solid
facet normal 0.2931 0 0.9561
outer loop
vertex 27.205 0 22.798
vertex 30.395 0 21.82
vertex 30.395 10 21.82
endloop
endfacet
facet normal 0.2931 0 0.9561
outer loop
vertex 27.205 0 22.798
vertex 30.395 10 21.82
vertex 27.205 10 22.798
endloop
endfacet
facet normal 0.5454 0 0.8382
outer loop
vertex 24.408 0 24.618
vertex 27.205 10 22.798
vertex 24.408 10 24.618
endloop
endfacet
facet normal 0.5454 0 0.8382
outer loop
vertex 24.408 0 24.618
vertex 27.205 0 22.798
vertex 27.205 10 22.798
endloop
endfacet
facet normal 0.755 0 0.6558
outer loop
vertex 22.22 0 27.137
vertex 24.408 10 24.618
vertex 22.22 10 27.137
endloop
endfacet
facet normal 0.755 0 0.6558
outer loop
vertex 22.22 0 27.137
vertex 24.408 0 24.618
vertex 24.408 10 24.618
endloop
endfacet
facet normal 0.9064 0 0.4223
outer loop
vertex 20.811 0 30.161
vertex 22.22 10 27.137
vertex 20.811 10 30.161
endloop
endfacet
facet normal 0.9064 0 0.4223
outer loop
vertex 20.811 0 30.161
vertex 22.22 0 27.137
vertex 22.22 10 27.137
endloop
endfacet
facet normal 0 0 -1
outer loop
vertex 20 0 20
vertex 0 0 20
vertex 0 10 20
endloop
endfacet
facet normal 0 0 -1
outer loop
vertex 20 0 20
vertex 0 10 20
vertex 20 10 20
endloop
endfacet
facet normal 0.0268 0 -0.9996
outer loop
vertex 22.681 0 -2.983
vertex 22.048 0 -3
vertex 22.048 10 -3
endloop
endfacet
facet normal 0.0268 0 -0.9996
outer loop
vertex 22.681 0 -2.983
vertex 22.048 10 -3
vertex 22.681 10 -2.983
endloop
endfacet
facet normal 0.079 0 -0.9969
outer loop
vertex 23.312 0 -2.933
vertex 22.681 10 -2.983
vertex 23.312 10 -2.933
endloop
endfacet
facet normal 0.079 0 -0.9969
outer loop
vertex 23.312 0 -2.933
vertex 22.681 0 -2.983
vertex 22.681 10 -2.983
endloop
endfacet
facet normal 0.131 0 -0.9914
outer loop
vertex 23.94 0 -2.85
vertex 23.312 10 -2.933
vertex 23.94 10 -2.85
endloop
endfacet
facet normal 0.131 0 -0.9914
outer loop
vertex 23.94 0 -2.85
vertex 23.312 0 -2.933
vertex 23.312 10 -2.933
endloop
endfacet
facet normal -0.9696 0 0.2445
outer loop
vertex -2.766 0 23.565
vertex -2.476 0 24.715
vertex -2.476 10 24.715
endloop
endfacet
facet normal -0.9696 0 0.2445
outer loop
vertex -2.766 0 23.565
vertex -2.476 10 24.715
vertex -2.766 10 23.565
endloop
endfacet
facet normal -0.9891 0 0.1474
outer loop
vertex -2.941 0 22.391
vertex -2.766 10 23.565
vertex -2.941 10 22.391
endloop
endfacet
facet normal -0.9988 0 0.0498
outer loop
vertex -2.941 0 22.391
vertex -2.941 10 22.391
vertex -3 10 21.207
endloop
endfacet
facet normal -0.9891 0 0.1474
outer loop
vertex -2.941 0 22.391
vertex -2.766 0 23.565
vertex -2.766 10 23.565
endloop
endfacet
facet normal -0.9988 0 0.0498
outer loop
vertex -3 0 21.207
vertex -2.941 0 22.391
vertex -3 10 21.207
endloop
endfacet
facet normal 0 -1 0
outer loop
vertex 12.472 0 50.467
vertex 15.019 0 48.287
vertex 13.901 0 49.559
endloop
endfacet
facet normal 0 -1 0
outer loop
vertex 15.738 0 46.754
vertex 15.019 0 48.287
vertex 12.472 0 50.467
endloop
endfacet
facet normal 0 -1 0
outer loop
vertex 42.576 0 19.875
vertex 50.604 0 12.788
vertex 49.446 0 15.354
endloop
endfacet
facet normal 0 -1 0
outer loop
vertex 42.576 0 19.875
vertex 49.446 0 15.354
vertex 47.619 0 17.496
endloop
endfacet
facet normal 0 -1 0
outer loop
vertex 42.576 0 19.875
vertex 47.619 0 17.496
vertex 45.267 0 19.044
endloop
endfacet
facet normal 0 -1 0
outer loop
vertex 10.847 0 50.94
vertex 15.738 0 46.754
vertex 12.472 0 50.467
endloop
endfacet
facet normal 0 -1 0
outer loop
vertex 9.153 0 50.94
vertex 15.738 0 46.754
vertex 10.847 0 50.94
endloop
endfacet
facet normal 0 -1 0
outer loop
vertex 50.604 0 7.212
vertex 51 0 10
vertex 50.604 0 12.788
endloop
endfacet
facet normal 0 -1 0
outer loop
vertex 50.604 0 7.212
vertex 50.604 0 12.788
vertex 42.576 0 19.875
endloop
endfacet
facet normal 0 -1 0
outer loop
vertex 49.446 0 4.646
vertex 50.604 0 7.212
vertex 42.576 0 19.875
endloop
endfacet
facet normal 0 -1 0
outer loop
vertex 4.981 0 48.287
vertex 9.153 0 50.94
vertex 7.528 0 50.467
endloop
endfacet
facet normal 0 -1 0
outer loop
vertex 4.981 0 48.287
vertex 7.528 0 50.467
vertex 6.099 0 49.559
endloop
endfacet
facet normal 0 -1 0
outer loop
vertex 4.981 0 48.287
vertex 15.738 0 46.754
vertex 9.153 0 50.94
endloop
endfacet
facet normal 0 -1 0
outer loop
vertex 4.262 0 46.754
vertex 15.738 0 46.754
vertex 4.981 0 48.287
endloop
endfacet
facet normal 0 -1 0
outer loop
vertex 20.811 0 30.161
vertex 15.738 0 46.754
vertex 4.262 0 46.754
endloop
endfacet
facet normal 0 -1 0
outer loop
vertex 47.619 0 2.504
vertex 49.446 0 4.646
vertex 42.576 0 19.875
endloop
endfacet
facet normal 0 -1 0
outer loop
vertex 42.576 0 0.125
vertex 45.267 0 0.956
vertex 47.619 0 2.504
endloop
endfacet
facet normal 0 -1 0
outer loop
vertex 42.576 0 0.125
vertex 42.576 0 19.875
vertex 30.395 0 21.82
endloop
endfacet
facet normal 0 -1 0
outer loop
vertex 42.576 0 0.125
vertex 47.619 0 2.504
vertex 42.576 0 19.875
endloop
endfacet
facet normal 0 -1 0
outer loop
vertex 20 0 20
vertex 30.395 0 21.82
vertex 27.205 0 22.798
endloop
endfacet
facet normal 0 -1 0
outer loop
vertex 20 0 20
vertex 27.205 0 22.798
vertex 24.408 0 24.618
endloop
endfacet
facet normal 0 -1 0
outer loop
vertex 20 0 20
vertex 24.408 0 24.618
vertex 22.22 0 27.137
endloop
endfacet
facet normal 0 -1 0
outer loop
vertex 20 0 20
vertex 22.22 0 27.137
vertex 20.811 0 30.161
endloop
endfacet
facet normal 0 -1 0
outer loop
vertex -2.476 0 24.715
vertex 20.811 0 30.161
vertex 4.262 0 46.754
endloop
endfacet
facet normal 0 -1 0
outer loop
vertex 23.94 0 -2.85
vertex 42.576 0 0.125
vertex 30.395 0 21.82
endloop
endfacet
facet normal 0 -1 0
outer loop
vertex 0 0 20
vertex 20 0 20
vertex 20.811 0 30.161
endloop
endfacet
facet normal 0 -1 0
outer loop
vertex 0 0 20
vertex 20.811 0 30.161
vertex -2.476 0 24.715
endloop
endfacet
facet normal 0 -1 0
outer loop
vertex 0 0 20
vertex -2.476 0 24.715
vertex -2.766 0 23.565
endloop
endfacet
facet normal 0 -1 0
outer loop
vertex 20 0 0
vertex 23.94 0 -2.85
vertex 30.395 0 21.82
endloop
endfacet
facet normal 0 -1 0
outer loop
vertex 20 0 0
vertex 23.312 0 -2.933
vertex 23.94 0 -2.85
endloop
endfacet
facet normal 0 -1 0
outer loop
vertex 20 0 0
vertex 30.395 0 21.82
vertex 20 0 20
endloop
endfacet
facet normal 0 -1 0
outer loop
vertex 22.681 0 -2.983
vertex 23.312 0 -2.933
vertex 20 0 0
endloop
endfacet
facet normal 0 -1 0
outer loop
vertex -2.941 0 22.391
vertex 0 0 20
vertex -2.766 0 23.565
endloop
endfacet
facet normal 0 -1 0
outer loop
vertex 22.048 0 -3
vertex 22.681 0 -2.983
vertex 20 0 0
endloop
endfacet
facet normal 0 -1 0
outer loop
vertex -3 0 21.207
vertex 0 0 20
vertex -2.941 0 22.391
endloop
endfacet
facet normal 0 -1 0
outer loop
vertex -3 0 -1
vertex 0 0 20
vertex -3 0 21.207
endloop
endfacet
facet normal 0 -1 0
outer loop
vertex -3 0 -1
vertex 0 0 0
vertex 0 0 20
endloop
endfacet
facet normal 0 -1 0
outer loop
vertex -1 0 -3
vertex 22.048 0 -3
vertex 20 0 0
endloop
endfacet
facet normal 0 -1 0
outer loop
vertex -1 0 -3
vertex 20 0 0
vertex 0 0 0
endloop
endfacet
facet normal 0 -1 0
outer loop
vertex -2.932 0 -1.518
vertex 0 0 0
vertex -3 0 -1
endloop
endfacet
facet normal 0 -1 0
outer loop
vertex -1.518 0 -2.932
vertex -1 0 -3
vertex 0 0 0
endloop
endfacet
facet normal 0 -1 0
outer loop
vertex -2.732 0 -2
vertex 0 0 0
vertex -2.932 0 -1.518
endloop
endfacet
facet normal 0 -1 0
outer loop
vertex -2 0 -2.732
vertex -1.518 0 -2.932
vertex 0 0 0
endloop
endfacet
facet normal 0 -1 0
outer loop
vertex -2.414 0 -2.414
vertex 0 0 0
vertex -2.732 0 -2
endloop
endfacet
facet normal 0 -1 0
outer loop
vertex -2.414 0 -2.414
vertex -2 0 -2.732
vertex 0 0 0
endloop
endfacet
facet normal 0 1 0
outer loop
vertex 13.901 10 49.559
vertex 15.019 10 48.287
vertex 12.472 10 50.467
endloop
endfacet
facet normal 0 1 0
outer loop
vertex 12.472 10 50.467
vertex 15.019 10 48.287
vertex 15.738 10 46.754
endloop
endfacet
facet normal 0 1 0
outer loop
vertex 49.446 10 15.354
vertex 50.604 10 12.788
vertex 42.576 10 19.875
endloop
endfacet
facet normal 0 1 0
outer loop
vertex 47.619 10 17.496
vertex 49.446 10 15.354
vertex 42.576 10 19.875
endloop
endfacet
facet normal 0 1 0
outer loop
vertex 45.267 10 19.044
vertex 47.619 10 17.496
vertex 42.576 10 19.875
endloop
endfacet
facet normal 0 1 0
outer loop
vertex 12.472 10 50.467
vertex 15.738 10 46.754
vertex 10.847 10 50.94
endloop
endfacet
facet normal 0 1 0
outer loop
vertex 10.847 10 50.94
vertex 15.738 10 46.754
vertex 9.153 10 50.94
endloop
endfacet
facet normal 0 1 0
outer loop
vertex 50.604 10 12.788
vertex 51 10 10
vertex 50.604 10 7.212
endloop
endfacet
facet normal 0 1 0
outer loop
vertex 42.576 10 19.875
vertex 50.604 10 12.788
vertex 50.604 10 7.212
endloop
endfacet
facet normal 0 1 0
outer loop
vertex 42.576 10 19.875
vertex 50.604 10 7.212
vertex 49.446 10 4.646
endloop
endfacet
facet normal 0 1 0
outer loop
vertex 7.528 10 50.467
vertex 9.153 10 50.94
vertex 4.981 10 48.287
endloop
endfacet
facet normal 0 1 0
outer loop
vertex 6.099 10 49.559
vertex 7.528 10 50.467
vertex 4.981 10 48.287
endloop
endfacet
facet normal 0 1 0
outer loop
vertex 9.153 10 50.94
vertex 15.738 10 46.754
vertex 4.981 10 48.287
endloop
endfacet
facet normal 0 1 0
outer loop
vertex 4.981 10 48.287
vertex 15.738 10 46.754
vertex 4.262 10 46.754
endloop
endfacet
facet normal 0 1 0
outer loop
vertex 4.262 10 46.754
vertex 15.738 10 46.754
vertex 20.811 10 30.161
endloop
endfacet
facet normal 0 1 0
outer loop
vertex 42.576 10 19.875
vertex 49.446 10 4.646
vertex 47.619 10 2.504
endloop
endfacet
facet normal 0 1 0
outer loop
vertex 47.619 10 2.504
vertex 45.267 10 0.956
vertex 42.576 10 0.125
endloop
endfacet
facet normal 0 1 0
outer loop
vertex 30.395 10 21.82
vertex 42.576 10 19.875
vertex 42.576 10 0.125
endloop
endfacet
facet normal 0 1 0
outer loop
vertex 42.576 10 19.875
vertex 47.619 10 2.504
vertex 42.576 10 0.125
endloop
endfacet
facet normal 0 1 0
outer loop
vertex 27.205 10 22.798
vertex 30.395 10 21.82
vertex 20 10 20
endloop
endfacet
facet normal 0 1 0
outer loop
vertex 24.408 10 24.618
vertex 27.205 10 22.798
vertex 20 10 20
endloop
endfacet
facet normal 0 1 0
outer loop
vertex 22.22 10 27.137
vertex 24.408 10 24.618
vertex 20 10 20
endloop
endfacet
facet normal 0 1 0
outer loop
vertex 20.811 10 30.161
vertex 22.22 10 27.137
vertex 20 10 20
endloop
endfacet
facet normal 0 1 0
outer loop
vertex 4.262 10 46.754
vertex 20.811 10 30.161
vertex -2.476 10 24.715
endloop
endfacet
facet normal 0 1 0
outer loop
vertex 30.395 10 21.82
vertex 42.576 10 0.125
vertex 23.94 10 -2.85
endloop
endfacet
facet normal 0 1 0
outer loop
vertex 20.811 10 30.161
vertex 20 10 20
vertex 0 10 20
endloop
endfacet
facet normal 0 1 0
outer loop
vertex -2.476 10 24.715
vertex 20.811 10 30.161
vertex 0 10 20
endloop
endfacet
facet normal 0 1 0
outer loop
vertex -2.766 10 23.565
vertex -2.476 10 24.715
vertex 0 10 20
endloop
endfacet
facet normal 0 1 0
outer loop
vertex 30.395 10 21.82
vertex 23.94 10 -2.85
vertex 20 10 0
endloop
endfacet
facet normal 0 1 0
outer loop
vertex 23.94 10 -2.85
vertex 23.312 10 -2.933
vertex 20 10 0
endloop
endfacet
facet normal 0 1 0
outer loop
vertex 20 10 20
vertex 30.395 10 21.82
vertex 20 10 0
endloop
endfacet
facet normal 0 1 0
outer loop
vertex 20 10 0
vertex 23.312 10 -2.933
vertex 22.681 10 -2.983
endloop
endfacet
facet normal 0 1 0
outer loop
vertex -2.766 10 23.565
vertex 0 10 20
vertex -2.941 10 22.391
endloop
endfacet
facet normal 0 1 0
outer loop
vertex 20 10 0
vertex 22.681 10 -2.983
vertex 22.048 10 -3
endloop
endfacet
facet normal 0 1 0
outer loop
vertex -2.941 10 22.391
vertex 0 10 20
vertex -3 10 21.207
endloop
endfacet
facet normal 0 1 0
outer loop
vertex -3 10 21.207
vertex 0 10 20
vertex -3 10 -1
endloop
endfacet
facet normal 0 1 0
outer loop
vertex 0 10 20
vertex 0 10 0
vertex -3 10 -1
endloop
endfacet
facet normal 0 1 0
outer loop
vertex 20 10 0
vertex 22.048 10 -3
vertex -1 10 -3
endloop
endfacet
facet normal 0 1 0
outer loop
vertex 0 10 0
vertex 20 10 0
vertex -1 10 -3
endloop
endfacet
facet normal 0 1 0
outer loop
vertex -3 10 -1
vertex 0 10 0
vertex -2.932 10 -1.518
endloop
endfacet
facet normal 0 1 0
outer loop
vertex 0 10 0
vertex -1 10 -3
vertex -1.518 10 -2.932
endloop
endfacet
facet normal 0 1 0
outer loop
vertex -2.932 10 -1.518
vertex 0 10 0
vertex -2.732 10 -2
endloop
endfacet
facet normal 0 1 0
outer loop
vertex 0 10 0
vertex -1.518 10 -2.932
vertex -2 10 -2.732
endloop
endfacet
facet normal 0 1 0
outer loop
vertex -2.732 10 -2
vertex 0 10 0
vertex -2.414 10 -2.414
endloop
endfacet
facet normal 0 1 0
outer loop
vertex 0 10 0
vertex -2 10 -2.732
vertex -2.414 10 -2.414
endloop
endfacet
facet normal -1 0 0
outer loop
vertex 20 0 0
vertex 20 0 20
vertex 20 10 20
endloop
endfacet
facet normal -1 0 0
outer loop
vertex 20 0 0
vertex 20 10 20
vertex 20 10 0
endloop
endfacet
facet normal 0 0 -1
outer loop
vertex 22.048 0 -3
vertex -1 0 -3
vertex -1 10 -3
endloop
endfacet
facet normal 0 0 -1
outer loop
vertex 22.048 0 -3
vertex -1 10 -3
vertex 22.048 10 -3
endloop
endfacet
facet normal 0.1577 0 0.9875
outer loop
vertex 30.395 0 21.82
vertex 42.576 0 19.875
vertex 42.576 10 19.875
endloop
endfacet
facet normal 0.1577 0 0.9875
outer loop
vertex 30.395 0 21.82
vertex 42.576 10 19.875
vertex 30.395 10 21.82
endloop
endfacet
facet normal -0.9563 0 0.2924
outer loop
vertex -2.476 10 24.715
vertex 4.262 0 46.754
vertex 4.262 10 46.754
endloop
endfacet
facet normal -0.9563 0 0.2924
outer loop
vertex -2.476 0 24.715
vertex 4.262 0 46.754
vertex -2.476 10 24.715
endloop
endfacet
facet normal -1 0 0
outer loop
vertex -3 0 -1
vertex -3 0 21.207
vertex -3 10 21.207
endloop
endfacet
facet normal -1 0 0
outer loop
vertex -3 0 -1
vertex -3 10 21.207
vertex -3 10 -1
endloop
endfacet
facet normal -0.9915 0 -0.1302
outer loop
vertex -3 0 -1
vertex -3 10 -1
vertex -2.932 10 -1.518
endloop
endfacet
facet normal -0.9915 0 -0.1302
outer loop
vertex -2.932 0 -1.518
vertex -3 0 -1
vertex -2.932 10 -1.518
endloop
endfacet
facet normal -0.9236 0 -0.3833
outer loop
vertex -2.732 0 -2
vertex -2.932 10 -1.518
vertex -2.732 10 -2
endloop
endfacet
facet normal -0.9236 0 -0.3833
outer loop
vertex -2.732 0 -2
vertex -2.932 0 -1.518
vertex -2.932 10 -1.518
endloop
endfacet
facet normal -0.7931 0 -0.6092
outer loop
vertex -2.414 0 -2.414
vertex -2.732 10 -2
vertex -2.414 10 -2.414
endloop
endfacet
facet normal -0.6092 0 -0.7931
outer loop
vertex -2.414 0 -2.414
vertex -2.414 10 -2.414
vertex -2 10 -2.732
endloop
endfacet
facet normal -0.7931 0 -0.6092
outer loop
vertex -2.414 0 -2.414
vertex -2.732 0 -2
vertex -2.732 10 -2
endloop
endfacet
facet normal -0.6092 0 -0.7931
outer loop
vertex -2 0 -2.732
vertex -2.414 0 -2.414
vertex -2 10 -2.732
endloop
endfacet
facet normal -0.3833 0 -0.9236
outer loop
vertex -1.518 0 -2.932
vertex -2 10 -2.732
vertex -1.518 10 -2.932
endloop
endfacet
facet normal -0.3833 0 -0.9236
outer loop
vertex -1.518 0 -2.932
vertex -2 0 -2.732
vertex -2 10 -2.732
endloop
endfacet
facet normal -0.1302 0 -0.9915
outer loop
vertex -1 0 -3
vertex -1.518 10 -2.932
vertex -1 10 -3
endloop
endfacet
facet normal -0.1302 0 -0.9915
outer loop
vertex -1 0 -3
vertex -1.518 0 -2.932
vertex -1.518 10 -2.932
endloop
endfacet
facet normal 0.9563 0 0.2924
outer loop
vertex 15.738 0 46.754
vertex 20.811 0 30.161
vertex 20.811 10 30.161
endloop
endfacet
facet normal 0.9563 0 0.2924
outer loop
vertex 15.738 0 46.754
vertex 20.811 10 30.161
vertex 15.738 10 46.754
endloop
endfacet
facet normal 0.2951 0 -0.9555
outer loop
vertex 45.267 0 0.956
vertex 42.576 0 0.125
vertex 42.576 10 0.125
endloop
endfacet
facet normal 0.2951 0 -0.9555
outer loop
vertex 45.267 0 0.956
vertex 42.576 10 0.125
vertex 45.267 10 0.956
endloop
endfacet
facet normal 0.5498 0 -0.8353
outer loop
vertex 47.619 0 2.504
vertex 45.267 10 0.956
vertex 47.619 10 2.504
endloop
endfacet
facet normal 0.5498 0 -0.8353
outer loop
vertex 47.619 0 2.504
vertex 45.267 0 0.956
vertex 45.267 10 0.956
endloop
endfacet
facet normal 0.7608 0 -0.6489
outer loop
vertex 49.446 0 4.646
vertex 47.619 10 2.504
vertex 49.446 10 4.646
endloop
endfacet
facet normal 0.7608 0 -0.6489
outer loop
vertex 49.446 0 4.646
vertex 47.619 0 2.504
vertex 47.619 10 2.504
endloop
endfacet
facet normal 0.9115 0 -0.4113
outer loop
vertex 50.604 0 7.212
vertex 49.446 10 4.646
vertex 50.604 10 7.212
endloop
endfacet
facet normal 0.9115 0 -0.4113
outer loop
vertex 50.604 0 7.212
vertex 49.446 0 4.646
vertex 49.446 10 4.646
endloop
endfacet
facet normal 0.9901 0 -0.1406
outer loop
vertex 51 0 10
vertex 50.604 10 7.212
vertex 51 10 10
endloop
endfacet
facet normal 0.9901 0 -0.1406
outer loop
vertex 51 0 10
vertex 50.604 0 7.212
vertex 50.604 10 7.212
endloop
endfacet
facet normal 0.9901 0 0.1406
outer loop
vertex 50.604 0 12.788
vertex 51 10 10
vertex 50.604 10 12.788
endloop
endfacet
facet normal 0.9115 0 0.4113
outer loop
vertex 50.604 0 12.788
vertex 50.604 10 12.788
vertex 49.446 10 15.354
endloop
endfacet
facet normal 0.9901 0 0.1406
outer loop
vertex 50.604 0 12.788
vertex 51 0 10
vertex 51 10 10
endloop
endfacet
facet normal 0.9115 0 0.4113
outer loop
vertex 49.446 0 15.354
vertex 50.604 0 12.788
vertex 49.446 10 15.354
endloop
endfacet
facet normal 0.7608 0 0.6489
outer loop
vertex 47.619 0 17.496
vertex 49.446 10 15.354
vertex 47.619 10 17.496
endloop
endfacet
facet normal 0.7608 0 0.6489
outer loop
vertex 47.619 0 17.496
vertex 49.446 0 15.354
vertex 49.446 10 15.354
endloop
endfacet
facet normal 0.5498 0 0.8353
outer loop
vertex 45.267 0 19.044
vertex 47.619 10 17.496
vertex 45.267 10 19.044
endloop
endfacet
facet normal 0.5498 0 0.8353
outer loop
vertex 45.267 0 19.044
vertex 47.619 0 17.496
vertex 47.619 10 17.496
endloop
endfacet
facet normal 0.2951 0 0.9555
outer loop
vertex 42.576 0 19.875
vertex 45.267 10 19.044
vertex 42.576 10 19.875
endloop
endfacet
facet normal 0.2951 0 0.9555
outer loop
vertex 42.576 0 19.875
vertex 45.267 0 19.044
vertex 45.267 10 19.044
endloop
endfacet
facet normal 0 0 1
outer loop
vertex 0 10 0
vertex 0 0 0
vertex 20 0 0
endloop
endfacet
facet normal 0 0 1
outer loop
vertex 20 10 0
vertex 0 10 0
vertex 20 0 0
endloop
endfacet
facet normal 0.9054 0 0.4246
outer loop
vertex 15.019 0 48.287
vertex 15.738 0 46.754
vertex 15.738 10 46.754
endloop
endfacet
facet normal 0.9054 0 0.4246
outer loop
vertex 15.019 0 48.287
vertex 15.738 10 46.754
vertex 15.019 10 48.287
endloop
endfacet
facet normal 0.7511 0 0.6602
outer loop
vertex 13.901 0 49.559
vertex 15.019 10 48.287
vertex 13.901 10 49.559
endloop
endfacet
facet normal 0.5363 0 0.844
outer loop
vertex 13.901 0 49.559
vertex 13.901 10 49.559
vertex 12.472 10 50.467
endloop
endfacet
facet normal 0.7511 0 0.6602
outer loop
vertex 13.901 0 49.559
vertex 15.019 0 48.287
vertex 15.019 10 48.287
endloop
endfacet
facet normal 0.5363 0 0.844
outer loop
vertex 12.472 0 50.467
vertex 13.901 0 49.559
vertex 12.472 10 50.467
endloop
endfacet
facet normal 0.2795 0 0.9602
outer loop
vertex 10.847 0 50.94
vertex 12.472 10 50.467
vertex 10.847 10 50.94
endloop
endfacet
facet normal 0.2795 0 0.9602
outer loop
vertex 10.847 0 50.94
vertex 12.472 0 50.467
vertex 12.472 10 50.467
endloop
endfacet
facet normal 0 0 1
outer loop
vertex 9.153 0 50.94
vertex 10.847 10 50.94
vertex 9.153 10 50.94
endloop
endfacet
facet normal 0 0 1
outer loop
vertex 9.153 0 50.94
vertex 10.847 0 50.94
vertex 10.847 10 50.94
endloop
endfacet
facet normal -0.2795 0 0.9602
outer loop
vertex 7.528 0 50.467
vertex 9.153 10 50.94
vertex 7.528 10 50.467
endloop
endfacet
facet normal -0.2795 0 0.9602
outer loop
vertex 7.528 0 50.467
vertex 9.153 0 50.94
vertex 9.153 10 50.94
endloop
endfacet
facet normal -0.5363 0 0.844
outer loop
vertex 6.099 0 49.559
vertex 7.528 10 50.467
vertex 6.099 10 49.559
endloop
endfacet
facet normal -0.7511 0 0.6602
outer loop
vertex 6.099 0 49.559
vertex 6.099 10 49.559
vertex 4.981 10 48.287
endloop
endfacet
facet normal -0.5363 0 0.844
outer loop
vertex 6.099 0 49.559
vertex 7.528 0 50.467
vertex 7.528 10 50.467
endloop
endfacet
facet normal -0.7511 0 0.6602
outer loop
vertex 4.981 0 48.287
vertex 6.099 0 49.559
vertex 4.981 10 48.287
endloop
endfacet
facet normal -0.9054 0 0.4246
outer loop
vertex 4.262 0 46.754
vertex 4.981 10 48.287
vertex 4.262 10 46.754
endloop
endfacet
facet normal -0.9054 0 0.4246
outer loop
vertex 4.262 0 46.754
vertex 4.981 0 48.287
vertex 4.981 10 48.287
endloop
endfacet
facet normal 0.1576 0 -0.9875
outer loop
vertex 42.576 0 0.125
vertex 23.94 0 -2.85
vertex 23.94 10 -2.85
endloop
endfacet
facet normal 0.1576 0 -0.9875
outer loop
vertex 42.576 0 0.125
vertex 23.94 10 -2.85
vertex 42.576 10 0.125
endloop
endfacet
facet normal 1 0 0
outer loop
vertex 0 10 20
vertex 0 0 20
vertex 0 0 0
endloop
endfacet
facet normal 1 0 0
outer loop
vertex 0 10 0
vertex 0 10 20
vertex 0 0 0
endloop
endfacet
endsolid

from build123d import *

# Parameters (mm, degrees)
SKETCH1_W           = 20
SKETCH1_H           = 20
BOSS_EXTRUDE1_DEPTH = 10


with BuildPart() as part:
    # Sketch1 → Boss-Extrude1 (new body)
    with BuildSketch(Plane(origin=(0, 0, 0), x_dir=(1, 0, 0), z_dir=(0, 1, 0))):
        with BuildLine():
            Line((23.939871077, 2.849965846), (42.576368333, -0.125028462))
            ThreePointArc((42.576368333, -0.125028462), (51, -10), (42.576368333, -19.874971538))
            Line((42.576368333, -19.874971538), (30.394725659, -21.819560004))
            ThreePointArc((30.394725659, -21.819560004), (24.408108439, -24.617839175), (20.810680125, -30.161165034))
            Line((20.810680125, -30.161165034), (15.737843767, -46.754180408))
            ThreePointArc((15.737843767, -46.754180408), (10, -51), (4.262156233, -46.754180408))
            Line((4.262156233, -46.754180408), (-2.475687534, -24.71500206))
            ThreePointArc((-2.475687534, -24.71500206), (-2.868198061, -22.980302653), (-3, -21.206641244))
            Line((-3, -21.206641244), (-3, 1))
            ThreePointArc((-3, 1), (-2.414213562, 2.414213562), (-1, 3))
            Line((-1, 3), (22.048229077, 3))
            ThreePointArc((22.048229077, 3), (22.997020375, 2.962432657), (23.939871077, 2.849965846))
        make_face()
        with Locations((10, -10)):
            Rectangle(SKETCH1_W, SKETCH1_H, mode=Mode.SUBTRACT)
    extrude(amount=BOSS_EXTRUDE1_DEPTH)


solid = part.part
